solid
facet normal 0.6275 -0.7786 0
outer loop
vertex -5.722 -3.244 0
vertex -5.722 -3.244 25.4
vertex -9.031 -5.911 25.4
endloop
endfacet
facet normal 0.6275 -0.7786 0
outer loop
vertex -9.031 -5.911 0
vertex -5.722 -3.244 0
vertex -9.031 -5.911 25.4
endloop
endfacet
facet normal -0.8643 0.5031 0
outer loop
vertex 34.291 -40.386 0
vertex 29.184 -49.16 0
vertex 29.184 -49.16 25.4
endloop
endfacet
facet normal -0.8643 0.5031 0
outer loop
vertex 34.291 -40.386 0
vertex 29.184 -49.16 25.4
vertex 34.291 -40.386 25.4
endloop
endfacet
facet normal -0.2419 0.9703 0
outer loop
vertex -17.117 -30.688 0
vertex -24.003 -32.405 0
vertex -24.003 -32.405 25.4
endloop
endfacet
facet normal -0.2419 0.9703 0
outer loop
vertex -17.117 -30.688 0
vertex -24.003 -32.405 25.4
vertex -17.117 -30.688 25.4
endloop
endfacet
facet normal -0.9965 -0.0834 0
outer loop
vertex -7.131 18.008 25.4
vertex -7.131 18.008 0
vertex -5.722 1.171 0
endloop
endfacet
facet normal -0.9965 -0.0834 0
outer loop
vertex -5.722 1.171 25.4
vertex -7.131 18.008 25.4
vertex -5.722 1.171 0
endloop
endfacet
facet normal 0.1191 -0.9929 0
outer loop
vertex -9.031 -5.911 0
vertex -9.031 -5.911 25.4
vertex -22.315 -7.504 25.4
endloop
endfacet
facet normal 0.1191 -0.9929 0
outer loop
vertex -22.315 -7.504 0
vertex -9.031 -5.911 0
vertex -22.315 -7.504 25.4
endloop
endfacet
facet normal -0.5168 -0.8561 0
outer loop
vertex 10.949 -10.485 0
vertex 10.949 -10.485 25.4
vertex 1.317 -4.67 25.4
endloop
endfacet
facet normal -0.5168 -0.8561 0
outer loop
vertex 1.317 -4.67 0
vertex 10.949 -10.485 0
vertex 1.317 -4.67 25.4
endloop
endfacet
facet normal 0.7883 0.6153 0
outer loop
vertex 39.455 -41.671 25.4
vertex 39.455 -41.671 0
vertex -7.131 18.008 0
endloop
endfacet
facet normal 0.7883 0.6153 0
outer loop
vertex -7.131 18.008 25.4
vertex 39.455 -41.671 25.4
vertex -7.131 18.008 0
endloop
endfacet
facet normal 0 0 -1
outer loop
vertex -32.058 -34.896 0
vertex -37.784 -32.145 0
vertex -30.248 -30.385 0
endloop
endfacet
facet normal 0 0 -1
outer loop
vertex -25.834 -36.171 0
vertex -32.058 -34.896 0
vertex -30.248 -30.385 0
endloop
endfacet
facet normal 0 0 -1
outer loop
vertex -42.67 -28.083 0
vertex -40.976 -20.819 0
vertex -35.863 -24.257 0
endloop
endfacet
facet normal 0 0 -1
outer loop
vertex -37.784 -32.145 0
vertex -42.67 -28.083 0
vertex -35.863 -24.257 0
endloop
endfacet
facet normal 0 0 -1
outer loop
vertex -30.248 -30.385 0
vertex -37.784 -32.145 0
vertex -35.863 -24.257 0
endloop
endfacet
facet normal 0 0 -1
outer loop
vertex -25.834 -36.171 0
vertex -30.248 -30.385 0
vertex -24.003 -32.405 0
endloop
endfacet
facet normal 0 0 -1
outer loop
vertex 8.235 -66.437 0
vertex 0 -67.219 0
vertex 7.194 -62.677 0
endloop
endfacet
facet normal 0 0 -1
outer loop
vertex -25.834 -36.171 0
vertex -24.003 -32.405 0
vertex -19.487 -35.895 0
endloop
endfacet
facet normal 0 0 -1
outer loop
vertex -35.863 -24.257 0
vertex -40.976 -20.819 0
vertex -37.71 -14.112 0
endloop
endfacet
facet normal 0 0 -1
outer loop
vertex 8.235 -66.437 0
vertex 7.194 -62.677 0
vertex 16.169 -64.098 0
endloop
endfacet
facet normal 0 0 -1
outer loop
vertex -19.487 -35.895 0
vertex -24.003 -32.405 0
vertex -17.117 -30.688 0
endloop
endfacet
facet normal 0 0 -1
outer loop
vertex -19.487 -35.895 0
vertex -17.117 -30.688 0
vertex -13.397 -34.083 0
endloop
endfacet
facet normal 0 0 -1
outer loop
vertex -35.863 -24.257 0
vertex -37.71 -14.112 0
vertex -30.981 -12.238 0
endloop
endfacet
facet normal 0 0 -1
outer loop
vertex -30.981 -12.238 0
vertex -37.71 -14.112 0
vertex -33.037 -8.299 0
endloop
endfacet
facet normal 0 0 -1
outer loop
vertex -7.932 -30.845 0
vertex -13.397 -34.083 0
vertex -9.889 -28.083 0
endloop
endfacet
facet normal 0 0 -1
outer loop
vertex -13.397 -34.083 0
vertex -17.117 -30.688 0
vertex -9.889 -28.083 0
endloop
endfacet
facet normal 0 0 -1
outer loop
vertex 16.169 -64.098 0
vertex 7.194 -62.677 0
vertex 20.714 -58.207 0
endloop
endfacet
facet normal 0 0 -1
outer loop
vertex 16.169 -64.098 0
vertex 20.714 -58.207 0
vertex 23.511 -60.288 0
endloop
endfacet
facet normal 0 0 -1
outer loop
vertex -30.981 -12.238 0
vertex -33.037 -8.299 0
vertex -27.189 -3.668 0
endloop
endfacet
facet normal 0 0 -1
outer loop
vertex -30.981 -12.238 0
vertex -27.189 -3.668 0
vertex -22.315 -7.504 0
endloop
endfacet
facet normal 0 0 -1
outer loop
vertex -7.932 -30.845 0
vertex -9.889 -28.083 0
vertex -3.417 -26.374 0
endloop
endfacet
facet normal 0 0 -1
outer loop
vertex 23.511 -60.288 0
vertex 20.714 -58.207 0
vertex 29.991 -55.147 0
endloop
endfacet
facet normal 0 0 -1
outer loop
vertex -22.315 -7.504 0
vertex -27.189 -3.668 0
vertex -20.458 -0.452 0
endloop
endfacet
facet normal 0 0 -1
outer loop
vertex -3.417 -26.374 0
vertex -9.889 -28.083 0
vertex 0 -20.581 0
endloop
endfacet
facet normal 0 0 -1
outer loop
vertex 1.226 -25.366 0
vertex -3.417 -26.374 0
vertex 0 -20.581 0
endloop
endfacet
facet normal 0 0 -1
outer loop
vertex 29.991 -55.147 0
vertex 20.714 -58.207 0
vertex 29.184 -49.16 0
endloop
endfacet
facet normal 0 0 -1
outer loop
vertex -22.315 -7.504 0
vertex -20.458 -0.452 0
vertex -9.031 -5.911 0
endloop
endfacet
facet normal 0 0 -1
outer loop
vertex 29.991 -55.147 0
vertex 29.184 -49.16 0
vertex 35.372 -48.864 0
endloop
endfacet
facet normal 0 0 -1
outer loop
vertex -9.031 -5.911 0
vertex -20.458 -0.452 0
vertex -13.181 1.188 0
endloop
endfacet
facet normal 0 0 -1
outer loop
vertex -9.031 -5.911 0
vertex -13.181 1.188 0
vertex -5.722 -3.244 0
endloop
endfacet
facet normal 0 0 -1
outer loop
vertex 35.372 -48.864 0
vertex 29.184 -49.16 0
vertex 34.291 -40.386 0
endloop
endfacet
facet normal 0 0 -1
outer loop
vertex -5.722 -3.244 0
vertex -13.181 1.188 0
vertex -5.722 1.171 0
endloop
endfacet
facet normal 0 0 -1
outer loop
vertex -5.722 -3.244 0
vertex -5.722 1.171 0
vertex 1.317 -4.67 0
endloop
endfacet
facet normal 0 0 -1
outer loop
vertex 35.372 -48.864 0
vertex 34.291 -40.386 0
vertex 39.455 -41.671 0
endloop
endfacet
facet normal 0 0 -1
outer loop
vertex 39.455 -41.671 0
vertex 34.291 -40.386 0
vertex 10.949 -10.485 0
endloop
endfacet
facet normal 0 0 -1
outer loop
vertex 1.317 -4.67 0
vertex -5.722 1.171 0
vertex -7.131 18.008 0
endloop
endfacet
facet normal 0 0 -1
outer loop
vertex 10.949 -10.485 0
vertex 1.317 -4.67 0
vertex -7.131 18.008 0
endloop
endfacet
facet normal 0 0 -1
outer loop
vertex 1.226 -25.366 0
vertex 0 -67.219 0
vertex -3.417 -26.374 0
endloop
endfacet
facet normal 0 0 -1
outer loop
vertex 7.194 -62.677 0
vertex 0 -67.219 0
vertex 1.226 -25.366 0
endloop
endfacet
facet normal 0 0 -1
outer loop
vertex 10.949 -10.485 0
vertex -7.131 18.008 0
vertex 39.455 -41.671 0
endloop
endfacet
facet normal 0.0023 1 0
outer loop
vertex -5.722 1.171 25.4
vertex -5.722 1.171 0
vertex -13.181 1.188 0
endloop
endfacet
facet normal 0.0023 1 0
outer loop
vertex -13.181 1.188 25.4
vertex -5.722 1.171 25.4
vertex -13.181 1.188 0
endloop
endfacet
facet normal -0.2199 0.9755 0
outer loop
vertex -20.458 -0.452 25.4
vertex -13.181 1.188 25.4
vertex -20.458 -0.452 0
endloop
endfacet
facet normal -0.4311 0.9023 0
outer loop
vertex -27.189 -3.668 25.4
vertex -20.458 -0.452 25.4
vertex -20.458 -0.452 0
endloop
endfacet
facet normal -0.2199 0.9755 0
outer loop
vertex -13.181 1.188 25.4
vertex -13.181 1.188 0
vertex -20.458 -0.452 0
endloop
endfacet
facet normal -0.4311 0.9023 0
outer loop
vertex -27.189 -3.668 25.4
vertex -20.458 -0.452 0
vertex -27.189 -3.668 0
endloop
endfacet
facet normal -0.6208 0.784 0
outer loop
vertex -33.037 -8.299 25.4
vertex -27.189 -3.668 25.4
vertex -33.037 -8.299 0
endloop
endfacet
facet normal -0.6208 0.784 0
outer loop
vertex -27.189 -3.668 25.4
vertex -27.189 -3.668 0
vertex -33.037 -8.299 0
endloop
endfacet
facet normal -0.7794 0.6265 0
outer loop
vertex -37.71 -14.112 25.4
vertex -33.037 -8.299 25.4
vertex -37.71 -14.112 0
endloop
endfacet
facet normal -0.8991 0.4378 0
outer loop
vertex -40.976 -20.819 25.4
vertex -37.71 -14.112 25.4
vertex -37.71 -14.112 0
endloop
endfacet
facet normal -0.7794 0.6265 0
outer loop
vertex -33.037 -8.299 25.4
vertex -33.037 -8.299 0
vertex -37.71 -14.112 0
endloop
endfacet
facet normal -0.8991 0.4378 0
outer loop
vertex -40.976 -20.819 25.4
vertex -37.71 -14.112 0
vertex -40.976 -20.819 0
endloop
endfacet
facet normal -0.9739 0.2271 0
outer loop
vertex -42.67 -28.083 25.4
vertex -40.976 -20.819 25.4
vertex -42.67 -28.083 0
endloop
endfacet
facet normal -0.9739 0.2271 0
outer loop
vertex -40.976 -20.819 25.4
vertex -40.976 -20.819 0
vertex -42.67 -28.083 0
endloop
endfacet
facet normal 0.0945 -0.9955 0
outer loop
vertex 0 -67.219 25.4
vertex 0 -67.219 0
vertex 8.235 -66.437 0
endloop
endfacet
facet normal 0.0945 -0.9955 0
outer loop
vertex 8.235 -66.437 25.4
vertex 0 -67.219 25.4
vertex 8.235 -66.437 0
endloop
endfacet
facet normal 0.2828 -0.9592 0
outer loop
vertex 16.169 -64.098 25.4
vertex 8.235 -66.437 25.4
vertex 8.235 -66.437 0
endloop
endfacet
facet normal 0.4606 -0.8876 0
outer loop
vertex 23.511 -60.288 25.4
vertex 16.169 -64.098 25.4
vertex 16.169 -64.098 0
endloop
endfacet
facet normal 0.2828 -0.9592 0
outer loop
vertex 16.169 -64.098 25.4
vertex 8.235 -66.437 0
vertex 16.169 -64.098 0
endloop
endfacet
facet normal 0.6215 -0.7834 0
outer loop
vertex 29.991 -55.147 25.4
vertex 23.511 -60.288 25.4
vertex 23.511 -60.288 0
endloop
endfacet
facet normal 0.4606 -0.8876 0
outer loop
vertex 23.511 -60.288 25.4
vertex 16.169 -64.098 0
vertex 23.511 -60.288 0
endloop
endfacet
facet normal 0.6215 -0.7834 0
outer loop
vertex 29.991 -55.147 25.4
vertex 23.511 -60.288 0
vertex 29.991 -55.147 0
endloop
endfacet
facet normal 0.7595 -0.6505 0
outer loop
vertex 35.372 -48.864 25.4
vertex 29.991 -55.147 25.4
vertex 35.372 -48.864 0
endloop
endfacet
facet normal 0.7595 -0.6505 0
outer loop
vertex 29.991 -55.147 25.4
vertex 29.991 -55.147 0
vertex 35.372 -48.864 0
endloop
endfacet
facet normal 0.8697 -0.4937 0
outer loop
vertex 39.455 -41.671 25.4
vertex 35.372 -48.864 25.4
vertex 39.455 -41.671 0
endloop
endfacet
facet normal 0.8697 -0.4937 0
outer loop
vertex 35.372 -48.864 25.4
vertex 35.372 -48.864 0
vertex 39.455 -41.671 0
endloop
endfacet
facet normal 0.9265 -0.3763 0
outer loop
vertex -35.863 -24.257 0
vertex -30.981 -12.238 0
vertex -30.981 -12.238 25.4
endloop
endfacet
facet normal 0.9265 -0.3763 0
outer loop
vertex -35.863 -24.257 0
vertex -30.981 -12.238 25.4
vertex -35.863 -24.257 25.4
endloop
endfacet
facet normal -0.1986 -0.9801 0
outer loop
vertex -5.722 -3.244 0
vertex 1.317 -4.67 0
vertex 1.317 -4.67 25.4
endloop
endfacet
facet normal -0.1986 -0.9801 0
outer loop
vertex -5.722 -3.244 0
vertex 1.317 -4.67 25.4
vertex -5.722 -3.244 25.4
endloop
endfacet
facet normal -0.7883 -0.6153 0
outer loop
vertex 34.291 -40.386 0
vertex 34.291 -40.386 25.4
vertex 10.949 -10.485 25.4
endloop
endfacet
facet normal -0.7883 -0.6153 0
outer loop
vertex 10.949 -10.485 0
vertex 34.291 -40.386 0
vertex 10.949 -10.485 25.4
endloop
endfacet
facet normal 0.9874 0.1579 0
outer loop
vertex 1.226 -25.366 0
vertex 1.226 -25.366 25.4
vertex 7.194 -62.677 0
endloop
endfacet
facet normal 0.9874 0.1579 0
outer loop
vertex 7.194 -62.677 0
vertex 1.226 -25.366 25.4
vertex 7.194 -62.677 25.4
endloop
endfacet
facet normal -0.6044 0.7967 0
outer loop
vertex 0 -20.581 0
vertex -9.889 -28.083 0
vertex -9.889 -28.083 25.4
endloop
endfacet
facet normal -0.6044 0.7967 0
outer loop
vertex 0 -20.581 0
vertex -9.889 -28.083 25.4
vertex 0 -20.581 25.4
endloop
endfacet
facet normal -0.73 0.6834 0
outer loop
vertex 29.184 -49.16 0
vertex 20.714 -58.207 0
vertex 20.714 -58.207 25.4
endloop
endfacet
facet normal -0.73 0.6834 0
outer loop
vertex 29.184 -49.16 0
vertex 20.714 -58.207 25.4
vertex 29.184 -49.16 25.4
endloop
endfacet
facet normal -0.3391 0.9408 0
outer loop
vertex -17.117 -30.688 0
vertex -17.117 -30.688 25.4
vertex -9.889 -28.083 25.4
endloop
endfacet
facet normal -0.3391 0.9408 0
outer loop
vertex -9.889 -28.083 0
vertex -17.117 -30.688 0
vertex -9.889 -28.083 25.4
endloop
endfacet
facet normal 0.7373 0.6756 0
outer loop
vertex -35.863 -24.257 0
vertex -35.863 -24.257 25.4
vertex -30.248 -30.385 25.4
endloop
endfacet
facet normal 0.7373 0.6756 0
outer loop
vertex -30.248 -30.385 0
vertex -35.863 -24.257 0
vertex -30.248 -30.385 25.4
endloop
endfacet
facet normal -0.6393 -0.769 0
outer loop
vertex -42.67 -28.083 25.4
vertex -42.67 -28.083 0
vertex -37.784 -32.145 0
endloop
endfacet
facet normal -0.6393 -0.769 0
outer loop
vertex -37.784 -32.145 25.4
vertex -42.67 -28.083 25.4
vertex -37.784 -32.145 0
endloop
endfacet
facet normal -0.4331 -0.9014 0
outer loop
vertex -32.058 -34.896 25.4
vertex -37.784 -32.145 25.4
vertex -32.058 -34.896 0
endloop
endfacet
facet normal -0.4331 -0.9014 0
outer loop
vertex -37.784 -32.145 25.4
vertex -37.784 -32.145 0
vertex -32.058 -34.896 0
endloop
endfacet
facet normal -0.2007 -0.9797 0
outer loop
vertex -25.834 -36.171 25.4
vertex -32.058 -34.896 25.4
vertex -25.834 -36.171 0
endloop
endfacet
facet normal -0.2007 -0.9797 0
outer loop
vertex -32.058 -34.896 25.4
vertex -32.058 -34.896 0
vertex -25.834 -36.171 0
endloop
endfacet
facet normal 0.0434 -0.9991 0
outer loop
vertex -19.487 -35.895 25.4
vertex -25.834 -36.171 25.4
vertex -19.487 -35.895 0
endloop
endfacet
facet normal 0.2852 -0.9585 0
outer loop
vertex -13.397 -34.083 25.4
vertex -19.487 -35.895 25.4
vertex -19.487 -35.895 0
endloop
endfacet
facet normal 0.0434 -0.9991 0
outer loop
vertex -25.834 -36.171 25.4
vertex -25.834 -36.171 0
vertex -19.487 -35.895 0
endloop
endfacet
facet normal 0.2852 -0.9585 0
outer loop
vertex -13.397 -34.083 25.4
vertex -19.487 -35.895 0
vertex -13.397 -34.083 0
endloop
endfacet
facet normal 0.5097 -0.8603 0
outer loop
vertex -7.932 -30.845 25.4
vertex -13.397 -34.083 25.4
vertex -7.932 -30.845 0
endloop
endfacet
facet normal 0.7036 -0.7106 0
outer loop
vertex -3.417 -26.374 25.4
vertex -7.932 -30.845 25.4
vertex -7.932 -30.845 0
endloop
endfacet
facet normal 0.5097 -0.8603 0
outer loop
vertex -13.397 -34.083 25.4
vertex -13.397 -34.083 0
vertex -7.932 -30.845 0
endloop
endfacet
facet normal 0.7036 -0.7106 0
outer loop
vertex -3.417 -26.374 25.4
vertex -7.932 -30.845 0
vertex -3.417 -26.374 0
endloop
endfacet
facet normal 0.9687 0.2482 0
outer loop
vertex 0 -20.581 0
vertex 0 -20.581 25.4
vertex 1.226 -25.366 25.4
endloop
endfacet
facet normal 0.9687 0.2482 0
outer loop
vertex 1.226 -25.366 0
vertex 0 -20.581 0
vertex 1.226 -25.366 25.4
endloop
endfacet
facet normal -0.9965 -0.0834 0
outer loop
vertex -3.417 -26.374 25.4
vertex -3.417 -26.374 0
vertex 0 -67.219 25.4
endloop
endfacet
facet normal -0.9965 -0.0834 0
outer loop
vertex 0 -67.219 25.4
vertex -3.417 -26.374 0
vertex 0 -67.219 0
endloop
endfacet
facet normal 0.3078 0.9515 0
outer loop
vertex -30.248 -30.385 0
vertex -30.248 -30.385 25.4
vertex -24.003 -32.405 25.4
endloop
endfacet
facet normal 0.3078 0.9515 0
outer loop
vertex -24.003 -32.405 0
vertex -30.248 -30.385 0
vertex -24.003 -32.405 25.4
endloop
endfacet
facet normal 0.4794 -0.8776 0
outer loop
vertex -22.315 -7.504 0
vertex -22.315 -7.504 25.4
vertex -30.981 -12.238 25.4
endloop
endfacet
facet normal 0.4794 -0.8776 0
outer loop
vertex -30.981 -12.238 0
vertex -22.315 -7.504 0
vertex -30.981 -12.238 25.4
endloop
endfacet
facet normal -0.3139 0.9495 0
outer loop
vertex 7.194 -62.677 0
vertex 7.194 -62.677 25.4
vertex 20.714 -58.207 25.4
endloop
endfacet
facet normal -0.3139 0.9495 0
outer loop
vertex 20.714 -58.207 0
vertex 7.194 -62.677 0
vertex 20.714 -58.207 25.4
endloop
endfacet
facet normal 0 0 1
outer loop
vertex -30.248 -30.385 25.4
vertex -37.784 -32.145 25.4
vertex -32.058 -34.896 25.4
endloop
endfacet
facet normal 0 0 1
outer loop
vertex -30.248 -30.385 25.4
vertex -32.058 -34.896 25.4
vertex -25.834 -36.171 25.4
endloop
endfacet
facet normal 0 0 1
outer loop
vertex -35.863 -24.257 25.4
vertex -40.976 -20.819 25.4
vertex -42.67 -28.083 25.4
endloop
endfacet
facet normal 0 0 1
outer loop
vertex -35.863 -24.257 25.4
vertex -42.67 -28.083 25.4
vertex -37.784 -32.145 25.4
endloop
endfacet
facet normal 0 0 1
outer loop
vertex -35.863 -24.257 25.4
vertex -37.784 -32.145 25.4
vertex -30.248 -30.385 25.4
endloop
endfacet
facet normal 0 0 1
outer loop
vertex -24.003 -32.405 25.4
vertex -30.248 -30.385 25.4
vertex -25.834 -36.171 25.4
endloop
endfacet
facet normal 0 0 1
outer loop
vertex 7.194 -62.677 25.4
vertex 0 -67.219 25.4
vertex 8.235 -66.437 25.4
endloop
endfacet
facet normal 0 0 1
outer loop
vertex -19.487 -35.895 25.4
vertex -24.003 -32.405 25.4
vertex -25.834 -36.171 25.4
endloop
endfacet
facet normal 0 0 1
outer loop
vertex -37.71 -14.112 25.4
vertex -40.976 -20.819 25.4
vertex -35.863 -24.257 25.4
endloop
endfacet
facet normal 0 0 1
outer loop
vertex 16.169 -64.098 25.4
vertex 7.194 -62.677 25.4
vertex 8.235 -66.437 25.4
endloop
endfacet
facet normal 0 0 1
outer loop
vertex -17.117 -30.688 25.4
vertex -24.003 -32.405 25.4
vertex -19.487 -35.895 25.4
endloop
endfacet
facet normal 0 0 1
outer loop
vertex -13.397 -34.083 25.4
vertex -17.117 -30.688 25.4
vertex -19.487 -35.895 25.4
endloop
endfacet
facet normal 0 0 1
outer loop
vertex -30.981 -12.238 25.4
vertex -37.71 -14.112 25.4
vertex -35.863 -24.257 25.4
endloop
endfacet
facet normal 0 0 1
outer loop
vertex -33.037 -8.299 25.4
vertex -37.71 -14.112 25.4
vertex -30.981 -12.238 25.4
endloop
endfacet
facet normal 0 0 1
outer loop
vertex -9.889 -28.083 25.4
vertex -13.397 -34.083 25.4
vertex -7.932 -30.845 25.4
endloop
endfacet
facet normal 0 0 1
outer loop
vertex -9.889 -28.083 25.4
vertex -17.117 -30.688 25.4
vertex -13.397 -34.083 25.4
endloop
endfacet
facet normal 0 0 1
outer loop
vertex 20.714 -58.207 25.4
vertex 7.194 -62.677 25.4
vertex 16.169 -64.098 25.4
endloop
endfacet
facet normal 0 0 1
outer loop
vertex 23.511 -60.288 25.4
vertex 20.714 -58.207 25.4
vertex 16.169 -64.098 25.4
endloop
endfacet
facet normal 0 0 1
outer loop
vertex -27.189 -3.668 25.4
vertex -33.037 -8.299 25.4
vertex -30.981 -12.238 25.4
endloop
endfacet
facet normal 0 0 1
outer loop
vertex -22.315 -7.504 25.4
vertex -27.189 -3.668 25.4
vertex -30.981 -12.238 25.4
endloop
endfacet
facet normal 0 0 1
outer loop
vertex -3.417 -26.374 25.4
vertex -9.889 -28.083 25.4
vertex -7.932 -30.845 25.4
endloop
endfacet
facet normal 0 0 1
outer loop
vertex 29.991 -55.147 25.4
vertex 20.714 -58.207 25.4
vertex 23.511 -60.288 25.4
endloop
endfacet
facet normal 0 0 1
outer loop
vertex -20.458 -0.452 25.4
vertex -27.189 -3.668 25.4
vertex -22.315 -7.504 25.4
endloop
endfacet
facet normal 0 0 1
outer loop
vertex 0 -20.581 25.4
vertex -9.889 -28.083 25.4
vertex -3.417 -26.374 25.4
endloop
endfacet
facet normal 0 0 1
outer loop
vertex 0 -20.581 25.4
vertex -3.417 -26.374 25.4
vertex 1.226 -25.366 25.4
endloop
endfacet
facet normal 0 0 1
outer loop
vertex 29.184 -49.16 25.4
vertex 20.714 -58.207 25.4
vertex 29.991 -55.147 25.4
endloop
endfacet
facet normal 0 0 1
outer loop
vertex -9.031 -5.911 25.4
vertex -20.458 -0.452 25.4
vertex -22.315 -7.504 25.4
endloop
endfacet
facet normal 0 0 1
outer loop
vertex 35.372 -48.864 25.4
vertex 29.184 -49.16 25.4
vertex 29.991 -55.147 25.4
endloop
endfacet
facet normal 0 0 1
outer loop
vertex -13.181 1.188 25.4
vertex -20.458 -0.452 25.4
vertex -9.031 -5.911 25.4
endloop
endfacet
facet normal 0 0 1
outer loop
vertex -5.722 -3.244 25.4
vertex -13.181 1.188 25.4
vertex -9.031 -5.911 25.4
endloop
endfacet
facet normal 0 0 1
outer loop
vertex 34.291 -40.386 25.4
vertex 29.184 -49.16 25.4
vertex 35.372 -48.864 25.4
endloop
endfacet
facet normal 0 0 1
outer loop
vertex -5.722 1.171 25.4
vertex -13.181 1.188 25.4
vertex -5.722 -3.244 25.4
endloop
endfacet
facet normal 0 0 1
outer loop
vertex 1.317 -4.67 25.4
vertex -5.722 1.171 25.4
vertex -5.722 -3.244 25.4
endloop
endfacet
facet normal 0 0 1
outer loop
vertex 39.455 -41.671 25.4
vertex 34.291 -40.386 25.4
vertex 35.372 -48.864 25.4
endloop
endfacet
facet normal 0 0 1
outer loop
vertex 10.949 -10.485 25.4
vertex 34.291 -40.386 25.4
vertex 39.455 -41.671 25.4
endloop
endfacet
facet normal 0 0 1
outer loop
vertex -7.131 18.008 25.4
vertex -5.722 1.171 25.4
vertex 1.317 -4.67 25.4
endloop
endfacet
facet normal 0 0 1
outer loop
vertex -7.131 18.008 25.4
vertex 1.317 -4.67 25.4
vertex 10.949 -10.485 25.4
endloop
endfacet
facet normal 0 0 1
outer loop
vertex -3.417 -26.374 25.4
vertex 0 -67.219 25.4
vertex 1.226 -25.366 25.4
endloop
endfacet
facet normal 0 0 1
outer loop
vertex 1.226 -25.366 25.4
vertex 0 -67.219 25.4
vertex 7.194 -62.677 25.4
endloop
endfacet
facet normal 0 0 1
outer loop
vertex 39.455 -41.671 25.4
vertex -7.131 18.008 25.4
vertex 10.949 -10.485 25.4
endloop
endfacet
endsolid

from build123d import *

# Parameters (mm, degrees)
F1_DEPTH = 25.4
F3_DEPTH = 25.4
F5_DEPTH = 25.4


with BuildPart() as f1:
    # F0 (on Top) → F1 (new body)
    with BuildSketch(Plane.XY):
        Polygon((-3.807562, -21.711232), (39.454739, -41.670527), (-7.130801, 18.008294), align=None)
        with BuildLine():
            Line((-3.807562, -21.711232), (0, -67.2194))
            ThreePointArc((0, -67.2194), (23.511012, -60.287986), (39.454739, -41.670527))
            Line((39.454739, -41.670527), (-3.807562, -21.711232))
        make_face()
    extrude(amount=F1_DEPTH)

    # F2 (on Top) → F3 (join)
    with BuildSketch(Plane.XY):
        with BuildLine():
            ThreePointArc((-42.670067, -28.083367), (-9.526807, -31.983188), (0, 0))
            ThreePointArc((0, 0), (-27.873553, -4.107011), (-42.670067, -28.083367))
        make_face()
    extrude(amount=F3_DEPTH)

    # F4 (on face) → F5 (cut)
    with BuildSketch(Plane.XY.offset(25.4)):
        Polygon((-9.030846, -5.911056), (-22.315262, -7.504281), (-11.007384, -7.504281), align=None)
        Polygon((-5.722075, -3.243963), (-9.030846, -5.911056), (1.316611, -4.670067), align=None)
        Polygon((-30.981028, -12.238209), (-35.863359, -24.257382), (-30.248286, -30.385217), (-24.002817, -32.40481), (-17.116513, -30.688128), (-9.888924, -28.083367), (0, -20.580618), (1.226096, -25.366375), (7.193933, -62.676668), (20.713773, -58.206778), (29.183986, -49.159691), (34.290549, -40.386488), (10.949366, -10.485058), (1.316611, -4.670067), (-9.030846, -5.911056), (-11.007384, -7.504281), (-22.315262, -7.504281), align=None)
    extrude(amount=-F5_DEPTH, mode=Mode.SUBTRACT)


solid = f1.part
